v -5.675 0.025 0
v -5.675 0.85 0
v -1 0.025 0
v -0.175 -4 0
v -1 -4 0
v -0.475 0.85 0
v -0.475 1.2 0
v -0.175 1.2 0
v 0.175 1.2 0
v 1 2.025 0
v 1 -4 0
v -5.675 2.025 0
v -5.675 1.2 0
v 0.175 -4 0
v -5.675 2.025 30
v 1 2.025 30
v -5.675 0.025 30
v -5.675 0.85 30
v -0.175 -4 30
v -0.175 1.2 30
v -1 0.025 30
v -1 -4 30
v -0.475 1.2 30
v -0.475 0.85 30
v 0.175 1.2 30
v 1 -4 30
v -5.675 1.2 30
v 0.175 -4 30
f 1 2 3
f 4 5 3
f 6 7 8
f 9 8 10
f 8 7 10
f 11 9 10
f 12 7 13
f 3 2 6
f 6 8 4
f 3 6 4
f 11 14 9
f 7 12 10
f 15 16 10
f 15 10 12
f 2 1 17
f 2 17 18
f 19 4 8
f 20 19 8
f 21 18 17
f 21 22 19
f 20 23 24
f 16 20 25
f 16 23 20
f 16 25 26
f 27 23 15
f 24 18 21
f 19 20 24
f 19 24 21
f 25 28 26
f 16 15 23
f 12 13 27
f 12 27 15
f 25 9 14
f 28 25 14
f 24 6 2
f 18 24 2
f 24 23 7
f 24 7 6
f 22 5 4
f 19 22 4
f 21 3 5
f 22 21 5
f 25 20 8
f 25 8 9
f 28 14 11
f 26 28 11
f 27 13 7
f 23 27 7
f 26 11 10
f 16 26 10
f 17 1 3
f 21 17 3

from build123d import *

# Parameters (mm, degrees)
SKETCH1_W           = 4.675
SKETCH1_H           = 0.825
BOSS_EXTRUDE1_DEPTH = 30


with BuildPart() as part:
    # Sketch1 → Boss-Extrude1 (new body)
    with BuildSketch(Plane.XY):
        with Locations((-3.3375, 1.6125)):
            Rectangle(SKETCH1_W, SKETCH1_H)
        with Locations((-3.3375, 0.4375)):
            Rectangle(SKETCH1_W, SKETCH1_H)
        Polygon((1, 2.025), (-1, 2.025), (-1, 1.2), (-0.475, 1.2), (-0.475, 0.85), (-1, 0.85), (-1, 0.025), (-1, -4), (-0.175, -4), (-0.175, 1.2), (0.175, 1.2), (0.175, -4), (1, -4), align=None)
    extrude(amount=BOSS_EXTRUDE1_DEPTH)


solid = part.part
